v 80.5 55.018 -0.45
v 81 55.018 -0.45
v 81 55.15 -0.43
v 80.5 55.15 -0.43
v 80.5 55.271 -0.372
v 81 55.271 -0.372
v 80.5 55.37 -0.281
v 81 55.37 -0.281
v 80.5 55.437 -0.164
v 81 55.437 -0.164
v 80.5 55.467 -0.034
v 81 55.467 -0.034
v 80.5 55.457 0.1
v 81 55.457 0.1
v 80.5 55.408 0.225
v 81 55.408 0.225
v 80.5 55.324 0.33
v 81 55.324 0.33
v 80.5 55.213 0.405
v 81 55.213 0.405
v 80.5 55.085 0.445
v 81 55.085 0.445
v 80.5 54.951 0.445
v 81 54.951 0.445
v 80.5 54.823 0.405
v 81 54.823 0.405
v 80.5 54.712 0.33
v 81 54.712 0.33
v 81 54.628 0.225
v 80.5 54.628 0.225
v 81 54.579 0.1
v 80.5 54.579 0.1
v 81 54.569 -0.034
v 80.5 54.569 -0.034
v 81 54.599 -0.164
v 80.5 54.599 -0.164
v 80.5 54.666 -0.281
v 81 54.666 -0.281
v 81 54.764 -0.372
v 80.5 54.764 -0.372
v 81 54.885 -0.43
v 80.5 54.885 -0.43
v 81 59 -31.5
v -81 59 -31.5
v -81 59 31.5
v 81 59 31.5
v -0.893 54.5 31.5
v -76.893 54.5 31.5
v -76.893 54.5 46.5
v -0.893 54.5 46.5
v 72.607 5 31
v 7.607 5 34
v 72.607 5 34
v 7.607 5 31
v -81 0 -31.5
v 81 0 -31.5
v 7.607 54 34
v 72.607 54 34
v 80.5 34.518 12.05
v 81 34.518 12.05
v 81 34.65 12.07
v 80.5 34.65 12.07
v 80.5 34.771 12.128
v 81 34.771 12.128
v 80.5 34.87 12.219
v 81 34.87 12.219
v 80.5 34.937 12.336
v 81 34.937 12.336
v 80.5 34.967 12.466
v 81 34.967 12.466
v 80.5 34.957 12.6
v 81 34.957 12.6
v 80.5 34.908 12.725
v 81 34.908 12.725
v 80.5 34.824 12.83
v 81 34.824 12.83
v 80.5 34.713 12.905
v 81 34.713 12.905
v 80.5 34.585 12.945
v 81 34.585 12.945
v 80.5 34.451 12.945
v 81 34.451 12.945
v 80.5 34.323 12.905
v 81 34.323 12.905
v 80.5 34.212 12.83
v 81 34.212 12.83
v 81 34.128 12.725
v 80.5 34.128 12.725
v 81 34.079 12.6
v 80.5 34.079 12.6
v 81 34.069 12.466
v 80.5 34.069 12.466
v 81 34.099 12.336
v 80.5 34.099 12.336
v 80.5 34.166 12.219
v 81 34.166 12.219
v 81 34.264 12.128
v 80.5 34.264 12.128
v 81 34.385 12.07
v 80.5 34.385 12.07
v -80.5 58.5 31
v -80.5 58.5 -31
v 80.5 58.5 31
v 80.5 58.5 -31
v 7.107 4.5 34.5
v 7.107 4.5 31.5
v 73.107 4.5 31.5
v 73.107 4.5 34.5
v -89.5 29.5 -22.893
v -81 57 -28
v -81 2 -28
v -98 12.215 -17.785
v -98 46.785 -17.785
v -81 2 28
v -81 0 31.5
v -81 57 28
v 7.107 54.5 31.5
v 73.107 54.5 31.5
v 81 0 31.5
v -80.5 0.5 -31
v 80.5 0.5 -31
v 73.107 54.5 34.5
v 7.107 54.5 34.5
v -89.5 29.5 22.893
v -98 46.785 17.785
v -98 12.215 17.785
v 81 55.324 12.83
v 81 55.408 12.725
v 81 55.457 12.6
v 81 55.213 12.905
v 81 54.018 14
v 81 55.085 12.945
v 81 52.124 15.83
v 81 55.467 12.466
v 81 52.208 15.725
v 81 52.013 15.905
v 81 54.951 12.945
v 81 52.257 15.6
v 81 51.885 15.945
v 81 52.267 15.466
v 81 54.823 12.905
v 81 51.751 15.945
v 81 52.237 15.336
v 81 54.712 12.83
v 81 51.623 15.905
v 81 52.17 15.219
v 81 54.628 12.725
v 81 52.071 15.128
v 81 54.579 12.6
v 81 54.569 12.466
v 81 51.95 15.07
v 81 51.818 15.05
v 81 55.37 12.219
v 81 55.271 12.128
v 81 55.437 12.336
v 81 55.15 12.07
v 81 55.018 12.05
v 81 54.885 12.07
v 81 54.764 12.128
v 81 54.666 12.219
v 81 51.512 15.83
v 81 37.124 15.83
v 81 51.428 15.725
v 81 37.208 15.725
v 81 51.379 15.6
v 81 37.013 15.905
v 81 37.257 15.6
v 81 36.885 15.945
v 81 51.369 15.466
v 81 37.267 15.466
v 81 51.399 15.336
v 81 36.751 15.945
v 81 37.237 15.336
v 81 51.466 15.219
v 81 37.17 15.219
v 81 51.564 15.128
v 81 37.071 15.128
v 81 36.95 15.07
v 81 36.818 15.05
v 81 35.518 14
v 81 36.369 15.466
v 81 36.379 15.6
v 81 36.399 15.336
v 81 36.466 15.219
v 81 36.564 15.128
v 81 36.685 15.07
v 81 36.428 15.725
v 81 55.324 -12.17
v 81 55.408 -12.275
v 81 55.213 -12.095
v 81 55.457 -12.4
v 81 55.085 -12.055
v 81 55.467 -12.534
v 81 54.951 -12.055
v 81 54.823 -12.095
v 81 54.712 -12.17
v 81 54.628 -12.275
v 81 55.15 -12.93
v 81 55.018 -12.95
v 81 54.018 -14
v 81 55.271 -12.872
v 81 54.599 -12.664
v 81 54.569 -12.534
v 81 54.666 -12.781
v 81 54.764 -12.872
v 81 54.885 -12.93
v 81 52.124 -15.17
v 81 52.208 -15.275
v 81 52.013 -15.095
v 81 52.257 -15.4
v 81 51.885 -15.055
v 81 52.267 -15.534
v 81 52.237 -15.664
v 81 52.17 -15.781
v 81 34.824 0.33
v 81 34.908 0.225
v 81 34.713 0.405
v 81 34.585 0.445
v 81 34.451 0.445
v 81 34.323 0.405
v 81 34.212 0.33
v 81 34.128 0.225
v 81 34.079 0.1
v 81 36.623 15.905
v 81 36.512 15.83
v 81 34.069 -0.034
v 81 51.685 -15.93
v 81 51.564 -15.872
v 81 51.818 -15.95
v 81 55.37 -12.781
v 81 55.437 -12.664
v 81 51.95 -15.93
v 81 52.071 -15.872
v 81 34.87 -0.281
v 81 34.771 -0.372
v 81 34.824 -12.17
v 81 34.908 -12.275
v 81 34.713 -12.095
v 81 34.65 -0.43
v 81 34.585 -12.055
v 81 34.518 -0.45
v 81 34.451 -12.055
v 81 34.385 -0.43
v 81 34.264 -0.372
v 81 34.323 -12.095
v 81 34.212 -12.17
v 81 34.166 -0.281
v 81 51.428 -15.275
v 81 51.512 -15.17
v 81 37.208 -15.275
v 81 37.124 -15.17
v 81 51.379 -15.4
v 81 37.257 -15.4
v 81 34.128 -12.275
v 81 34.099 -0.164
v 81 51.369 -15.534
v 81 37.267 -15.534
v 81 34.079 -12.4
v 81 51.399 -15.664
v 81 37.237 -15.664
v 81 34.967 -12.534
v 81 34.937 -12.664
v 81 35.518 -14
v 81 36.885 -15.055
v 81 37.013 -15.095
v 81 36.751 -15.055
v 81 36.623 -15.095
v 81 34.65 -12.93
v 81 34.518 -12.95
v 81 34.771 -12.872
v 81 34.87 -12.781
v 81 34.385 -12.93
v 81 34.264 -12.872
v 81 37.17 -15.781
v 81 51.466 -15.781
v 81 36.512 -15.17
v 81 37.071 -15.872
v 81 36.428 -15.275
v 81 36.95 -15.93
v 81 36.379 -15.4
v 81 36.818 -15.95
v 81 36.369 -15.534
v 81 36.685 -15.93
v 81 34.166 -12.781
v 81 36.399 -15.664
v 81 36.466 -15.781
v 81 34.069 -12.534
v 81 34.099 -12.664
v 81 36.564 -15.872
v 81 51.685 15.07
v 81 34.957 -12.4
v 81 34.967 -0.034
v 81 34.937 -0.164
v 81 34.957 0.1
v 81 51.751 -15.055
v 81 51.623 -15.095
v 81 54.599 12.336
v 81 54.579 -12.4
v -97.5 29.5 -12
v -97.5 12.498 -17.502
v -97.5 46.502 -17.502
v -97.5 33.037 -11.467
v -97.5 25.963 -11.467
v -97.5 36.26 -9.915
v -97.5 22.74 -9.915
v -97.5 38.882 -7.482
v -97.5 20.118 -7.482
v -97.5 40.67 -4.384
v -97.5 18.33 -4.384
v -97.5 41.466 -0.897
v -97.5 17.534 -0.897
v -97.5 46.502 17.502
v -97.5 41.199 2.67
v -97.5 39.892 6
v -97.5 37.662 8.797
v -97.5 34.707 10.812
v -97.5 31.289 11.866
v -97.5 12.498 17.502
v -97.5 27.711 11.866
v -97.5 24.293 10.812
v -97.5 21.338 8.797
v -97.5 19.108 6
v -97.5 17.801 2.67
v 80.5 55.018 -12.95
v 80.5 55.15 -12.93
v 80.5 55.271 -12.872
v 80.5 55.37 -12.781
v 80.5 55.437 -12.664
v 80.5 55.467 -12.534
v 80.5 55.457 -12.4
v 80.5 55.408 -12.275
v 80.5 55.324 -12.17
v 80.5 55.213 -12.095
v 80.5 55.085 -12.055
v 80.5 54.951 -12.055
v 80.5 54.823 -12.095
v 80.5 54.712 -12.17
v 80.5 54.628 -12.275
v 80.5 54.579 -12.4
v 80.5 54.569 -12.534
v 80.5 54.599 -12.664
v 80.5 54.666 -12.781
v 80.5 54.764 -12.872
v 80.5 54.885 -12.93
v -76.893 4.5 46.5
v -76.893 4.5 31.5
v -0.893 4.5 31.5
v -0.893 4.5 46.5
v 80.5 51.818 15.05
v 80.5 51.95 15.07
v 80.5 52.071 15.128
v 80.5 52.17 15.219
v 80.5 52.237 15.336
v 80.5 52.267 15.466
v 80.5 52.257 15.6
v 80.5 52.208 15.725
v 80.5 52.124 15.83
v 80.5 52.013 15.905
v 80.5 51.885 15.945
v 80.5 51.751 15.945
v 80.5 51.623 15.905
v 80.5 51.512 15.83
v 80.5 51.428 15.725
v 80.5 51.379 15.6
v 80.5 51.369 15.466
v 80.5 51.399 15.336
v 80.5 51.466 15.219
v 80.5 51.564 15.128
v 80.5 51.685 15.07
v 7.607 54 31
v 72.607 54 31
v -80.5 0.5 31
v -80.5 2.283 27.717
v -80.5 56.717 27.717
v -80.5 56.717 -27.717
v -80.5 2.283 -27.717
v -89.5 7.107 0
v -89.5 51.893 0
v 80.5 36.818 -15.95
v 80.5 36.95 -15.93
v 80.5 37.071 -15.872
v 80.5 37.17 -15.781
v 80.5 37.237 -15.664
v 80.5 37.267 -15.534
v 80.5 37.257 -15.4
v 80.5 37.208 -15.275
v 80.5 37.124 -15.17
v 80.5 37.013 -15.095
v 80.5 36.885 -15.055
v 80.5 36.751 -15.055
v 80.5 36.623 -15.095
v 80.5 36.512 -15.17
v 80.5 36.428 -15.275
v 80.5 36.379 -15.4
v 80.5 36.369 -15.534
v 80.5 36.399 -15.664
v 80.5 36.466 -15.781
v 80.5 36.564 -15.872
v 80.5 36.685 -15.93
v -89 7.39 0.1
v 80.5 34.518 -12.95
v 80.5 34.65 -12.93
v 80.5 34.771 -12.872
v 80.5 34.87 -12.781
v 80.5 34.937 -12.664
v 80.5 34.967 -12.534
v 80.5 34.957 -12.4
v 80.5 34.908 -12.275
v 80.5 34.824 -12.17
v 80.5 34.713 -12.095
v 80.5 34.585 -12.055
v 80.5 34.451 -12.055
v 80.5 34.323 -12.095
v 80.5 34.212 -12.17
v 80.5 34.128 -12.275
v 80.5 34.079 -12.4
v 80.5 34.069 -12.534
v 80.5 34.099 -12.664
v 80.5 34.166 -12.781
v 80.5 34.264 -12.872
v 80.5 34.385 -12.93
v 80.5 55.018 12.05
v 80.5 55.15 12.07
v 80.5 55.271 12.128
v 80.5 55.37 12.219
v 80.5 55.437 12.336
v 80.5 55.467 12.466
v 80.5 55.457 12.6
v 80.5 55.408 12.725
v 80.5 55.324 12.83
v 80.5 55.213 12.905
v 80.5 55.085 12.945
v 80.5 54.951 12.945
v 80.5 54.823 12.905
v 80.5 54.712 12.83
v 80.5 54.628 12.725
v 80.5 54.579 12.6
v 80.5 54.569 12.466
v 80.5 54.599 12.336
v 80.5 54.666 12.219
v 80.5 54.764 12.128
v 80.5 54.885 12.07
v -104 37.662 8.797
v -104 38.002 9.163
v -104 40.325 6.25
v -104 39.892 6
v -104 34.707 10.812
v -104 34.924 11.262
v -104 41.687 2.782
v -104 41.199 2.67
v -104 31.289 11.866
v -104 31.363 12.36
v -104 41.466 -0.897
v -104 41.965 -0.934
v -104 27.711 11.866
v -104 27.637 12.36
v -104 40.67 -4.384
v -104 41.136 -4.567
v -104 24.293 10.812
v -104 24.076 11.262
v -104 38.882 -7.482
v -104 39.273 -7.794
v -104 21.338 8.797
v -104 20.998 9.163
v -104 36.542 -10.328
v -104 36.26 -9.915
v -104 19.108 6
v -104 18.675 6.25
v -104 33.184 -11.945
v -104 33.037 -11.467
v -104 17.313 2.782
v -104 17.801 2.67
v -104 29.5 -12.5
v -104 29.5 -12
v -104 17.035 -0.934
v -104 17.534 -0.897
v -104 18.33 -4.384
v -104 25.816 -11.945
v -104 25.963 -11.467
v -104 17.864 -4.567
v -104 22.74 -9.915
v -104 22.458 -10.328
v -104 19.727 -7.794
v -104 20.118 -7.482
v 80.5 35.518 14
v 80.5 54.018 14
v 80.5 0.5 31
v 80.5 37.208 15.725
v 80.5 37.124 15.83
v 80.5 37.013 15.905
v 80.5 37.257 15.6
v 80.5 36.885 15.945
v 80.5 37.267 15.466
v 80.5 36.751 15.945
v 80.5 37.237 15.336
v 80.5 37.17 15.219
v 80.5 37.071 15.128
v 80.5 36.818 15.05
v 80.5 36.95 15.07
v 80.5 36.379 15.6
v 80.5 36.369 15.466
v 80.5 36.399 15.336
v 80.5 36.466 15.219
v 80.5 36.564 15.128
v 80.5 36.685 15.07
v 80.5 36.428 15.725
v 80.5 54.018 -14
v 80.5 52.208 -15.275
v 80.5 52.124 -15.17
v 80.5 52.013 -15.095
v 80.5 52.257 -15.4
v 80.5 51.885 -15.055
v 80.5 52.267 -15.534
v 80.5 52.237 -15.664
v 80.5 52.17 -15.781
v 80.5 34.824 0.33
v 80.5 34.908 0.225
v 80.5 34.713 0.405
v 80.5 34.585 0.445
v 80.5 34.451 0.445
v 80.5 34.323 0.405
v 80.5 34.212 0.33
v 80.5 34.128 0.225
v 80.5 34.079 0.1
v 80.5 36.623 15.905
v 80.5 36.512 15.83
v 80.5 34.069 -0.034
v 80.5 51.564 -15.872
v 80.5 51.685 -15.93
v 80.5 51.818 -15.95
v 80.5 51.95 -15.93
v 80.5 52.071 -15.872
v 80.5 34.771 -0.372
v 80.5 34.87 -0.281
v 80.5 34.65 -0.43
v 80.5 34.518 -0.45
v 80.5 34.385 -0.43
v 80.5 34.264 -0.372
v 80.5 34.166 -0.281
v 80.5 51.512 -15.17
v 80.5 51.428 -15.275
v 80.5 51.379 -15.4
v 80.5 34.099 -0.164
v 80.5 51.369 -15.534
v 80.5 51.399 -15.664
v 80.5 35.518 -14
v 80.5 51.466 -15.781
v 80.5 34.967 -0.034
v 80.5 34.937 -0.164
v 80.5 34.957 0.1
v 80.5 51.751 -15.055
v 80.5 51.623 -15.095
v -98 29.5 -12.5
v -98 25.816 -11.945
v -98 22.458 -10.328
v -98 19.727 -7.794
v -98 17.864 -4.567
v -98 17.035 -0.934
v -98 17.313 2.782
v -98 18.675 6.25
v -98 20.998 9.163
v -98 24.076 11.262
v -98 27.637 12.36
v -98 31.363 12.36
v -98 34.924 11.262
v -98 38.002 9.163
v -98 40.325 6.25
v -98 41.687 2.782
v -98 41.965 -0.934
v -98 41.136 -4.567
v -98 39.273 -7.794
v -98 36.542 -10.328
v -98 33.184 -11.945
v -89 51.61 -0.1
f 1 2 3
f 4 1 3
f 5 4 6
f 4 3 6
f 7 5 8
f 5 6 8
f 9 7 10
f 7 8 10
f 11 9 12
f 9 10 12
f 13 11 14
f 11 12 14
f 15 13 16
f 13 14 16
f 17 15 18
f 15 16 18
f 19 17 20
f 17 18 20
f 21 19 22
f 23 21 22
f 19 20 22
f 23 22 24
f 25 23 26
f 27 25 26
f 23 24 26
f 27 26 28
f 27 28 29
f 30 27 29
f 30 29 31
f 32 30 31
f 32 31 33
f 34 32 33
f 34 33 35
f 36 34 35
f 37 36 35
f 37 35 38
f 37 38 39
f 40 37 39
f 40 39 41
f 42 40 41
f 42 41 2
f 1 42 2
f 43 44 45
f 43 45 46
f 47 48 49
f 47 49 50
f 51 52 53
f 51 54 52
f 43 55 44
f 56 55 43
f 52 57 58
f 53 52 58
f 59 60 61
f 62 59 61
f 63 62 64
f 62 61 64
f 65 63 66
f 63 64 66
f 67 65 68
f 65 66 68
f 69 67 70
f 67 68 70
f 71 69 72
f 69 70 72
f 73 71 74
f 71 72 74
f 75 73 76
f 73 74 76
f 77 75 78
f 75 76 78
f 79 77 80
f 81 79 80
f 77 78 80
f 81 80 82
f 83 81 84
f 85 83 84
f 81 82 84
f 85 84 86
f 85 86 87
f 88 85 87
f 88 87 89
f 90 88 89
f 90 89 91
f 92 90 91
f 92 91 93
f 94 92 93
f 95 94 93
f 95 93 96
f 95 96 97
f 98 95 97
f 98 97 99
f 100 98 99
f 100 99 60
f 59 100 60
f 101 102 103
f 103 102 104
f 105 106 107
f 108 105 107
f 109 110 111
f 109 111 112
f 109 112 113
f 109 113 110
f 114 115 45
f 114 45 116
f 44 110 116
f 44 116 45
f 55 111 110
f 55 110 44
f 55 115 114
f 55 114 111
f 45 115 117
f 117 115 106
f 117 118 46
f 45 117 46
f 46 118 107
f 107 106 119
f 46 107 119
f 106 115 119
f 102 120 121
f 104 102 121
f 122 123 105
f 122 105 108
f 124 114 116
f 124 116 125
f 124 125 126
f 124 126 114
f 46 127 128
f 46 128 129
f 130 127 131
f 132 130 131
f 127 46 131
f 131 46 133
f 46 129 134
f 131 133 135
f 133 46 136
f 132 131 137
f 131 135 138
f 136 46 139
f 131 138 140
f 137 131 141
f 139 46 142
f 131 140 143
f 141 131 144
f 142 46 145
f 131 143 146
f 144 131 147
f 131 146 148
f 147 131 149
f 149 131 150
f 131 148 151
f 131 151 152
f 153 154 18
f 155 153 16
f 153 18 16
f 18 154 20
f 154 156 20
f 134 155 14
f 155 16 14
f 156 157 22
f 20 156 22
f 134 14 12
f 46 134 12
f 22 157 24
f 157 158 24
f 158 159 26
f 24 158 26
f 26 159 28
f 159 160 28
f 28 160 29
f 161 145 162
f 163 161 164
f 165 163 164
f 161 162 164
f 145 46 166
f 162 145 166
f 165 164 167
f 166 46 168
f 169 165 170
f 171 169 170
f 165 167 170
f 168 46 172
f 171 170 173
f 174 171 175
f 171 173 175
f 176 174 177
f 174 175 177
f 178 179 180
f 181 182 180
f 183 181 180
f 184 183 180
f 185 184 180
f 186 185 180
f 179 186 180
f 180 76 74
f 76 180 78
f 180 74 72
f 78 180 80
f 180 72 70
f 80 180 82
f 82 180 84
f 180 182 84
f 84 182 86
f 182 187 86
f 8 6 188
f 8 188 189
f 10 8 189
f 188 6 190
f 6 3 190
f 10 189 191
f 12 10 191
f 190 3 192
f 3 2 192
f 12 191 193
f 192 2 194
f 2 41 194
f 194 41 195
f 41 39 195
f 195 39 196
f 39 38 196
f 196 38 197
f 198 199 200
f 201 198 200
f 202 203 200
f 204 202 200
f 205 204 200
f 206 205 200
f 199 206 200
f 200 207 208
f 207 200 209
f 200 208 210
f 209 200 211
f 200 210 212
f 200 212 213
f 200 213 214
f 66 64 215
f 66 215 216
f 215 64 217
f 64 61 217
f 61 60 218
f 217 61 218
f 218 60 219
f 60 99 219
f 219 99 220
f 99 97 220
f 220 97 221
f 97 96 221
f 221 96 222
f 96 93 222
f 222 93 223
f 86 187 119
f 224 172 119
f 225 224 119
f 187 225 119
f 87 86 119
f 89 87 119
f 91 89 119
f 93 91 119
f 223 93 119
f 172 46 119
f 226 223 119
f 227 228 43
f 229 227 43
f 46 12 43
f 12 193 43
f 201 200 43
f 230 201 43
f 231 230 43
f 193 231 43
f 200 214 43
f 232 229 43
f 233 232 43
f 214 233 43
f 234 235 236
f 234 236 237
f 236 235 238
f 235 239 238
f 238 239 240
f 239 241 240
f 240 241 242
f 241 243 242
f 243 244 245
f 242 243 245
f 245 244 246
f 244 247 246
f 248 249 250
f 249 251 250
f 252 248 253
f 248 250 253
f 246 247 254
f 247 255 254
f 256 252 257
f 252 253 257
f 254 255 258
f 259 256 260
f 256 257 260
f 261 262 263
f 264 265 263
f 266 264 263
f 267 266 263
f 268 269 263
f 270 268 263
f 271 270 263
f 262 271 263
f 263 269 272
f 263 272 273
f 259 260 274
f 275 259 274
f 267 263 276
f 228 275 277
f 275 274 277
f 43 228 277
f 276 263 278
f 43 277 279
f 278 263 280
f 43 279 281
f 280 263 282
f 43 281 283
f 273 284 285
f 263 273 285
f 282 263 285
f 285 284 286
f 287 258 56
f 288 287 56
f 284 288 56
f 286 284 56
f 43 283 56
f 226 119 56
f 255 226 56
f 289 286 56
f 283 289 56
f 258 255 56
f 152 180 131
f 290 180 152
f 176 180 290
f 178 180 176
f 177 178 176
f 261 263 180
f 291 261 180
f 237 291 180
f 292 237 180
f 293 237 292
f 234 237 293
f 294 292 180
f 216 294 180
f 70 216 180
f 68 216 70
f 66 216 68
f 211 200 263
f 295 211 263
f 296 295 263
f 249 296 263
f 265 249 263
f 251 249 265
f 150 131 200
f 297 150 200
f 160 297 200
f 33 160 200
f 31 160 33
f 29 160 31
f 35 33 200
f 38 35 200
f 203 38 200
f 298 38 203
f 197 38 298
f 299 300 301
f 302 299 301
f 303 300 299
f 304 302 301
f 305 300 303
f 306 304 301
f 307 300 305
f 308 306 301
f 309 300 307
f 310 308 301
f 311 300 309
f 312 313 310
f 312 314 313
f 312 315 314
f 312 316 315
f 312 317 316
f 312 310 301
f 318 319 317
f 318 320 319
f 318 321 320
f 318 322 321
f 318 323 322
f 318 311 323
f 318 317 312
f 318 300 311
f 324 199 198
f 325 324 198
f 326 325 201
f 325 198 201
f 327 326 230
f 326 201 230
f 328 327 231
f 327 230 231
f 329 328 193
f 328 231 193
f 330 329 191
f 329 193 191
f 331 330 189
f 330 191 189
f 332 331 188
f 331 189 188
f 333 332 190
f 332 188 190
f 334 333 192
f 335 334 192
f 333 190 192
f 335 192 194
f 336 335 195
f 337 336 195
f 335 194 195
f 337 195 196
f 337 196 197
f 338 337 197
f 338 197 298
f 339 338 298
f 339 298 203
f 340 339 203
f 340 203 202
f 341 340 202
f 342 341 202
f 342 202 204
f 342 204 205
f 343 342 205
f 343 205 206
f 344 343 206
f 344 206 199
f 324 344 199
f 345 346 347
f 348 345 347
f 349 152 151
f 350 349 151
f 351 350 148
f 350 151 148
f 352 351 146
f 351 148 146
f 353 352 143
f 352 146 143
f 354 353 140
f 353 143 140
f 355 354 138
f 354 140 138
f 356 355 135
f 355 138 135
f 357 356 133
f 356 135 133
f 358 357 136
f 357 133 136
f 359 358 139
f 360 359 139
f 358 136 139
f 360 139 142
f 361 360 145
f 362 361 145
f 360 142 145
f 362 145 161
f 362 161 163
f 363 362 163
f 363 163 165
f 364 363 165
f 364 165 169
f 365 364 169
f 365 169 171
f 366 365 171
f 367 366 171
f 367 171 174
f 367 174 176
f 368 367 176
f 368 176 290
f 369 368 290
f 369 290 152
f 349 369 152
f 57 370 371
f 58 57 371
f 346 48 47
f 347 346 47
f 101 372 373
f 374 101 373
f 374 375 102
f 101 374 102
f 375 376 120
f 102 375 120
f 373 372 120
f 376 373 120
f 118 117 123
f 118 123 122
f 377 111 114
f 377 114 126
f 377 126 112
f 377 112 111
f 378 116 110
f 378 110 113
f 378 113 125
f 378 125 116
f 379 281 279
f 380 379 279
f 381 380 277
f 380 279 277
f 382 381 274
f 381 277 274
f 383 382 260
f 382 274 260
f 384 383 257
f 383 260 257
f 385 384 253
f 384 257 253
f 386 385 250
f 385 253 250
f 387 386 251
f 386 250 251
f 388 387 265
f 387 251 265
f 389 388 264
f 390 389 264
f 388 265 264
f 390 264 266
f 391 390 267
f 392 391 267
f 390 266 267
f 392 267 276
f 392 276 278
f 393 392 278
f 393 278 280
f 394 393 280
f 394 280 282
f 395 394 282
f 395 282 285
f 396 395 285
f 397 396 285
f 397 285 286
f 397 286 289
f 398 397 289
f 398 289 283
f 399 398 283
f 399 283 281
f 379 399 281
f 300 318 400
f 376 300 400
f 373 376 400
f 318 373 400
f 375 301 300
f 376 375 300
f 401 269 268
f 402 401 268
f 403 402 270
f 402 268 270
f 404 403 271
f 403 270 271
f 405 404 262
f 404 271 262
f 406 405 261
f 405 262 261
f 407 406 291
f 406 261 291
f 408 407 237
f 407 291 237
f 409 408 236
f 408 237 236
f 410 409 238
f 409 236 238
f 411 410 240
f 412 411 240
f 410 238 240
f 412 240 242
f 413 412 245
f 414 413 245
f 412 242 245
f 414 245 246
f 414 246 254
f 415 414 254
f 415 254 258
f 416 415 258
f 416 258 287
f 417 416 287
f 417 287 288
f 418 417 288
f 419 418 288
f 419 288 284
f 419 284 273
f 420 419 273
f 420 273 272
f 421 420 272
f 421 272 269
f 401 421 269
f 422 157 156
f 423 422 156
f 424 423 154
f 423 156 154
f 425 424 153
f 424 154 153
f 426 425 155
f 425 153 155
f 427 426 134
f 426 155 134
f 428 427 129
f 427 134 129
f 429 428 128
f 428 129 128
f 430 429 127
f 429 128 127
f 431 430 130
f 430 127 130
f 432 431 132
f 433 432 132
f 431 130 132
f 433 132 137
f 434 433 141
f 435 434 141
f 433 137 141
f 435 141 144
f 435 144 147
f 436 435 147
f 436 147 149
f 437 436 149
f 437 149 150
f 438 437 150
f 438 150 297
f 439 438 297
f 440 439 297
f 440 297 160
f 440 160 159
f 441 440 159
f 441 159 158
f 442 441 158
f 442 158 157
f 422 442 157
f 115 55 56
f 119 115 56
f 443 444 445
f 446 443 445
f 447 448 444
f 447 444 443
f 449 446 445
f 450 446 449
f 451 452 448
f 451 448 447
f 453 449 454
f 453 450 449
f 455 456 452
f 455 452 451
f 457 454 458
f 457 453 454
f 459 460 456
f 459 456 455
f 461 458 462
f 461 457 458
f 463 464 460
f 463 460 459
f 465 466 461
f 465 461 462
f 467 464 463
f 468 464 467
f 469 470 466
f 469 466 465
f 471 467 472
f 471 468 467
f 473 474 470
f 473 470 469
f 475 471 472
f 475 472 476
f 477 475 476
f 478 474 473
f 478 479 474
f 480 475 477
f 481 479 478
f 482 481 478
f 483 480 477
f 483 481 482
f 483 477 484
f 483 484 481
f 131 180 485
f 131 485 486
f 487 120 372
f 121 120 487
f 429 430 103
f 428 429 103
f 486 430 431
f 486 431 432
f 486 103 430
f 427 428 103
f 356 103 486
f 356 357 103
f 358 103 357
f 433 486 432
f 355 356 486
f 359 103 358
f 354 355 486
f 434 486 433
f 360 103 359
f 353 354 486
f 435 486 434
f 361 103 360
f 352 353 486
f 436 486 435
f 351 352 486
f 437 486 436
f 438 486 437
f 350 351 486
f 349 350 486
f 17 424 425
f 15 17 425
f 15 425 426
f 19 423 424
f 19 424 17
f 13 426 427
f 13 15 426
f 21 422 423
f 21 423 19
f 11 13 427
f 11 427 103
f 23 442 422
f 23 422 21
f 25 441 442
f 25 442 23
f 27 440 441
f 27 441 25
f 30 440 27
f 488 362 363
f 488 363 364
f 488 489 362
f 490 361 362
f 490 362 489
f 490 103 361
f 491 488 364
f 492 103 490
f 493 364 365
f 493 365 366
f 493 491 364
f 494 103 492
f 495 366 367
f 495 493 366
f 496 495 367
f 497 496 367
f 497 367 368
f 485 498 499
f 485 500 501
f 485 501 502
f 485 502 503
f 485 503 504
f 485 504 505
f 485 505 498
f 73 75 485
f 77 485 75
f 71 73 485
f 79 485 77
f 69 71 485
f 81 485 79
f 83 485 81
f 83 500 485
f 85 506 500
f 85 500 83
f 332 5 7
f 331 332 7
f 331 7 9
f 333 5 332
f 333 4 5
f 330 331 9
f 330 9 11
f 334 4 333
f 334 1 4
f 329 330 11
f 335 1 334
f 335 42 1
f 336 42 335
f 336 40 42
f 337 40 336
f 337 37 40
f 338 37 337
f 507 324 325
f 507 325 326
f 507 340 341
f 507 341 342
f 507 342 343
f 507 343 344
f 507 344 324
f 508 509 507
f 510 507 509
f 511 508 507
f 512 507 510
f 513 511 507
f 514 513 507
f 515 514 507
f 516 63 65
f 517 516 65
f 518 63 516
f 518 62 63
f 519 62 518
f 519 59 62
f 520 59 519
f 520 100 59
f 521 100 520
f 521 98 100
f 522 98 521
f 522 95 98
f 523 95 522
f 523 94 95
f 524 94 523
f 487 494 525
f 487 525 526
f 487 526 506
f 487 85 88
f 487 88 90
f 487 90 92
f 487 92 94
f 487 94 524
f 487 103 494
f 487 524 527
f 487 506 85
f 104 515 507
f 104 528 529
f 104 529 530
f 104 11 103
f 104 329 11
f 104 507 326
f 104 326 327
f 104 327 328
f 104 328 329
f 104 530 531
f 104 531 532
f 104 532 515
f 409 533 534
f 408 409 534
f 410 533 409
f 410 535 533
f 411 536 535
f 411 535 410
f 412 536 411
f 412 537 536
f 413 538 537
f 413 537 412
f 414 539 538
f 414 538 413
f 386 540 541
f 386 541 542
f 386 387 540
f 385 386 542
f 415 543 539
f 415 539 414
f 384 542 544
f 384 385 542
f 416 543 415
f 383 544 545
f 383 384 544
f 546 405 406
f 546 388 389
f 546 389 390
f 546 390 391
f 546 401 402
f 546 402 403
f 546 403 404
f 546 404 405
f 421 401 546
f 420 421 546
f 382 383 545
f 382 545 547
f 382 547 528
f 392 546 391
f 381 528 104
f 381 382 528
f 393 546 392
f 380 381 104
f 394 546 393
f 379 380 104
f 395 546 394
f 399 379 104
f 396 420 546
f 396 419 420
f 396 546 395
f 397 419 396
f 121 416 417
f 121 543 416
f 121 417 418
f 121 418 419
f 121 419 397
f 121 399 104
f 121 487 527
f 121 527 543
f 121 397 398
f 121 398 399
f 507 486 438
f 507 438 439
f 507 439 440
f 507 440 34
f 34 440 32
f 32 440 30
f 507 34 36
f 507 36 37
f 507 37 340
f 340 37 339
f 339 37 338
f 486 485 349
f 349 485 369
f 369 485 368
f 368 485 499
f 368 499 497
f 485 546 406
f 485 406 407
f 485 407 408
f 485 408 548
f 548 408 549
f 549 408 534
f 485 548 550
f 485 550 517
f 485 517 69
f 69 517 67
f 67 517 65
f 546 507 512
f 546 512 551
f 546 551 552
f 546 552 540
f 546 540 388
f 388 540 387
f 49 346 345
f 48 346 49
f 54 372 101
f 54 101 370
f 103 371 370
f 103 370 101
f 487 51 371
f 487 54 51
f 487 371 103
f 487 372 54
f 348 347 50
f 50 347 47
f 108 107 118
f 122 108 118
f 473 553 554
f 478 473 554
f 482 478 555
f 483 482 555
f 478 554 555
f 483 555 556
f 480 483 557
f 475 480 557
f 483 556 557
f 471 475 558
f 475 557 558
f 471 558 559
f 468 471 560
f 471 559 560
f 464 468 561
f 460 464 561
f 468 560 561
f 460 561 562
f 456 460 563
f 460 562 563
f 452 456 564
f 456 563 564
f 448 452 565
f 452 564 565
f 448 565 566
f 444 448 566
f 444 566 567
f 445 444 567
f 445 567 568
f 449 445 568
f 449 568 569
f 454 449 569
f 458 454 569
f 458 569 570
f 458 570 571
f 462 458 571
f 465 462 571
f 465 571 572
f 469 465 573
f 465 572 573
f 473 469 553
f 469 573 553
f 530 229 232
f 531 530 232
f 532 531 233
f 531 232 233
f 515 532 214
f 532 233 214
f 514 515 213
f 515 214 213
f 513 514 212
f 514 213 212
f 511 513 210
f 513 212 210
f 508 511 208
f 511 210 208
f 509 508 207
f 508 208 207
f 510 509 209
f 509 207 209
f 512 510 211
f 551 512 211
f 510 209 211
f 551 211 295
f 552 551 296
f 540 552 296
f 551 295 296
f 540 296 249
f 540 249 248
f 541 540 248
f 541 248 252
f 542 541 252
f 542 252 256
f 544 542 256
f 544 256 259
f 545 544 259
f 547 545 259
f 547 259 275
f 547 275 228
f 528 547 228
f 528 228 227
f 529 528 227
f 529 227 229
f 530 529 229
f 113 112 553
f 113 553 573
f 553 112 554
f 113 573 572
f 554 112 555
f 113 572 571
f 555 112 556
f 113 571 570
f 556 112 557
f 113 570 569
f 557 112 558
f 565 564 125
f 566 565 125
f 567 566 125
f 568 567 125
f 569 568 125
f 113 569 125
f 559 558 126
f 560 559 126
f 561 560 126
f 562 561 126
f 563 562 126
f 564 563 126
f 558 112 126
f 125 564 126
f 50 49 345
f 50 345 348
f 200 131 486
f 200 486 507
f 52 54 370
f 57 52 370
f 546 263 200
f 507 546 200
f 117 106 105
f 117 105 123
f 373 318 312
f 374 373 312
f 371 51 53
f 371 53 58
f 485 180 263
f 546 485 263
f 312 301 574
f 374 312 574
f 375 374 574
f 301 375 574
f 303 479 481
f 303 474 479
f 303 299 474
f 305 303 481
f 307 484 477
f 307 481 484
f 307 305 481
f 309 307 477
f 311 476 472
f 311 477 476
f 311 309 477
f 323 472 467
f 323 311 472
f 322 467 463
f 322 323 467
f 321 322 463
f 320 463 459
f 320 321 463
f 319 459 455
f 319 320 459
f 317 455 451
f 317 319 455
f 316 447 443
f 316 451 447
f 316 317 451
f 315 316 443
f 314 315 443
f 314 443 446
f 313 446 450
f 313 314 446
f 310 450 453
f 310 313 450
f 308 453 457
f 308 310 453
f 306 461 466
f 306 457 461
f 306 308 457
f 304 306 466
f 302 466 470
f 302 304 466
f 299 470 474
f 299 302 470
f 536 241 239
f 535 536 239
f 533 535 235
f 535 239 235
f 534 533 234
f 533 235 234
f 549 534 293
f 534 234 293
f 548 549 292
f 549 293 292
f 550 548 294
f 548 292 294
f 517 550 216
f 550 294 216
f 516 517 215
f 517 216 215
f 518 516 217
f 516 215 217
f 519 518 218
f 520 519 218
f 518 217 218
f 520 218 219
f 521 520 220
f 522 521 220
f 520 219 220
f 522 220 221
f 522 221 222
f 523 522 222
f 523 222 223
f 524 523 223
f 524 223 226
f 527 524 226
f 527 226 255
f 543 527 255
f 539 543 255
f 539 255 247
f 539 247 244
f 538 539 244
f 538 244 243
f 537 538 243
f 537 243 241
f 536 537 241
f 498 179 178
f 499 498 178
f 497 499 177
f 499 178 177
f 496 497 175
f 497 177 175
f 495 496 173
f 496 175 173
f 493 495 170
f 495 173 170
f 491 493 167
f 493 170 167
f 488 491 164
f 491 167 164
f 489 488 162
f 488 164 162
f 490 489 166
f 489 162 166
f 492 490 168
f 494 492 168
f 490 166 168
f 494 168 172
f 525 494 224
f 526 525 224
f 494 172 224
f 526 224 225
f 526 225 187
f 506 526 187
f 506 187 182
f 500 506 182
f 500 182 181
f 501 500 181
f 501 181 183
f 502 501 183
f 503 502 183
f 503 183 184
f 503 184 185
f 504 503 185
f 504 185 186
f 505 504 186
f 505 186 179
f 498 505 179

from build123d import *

# Parameters (mm, degrees)
SKETCH1_W           = 1620
SKETCH1_H           = 630
BOSS_EXTRUDE1_DEPTH = 590
SKETCH2_W           = 760
SKETCH2_H           = 500
BOSS_EXTRUDE2_DEPTH = 150
SKETCH3_W           = 560
SKETCH3_H           = 550
BOSS_EXTRUDE3_DEPTH = 170
BOSS_EXTRUDE3_TAPER = 31
SKETCH4_R           = 125
BOSS_EXTRUDE4_DEPTH = 60
SKETCH5_W           = 660
SKETCH5_H           = 500
BOSS_EXTRUDE5_DEPTH = 30
SHELL1_T            = -5
SKETCH7_R           = 4.5
SKETCH7_W           = 280
SKETCH7_H           = 185
CUT_EXTRUDE1_DEPTH  = 10
SCALE1_SCALE        = 0.1


with BuildPart() as part:
    # Sketch1 → Boss-Extrude1 (new body)
    with BuildSketch(Plane(origin=(0, 0, 0), x_dir=(1, 0, 0), z_dir=(0, 1, 0))):
        Rectangle(SKETCH1_W, SKETCH1_H)
    extrude(amount=BOSS_EXTRUDE1_DEPTH)

    # Sketch3 → Boss-Extrude3 (add)
    with BuildSketch(Plane.ZY.offset(810)):
        with Locations((0, 295)):
            Rectangle(SKETCH3_W, SKETCH3_H)
    extrude(amount=BOSS_EXTRUDE3_DEPTH, taper=BOSS_EXTRUDE3_TAPER)

    # Sketch4 → Boss-Extrude4 (add)
    with BuildSketch(Plane.ZY.offset(980)):
        with Locations(Location((0, 295, 0), (0, 0, 180))):
            Circle(SKETCH4_R)
    extrude(amount=BOSS_EXTRUDE4_DEPTH)

    # Sketch5 → Boss-Extrude5 (add)
    with BuildSketch(Plane.XY.offset(315)):
        with Locations((401.07364471, 295)):
            Rectangle(SKETCH5_W, SKETCH5_H)
    extrude(amount=BOSS_EXTRUDE5_DEPTH)

    # Shell1
    shell1_openings = [part.faces().sort_by_distance(p)[0] for p in [
        (-1040, 295, 0),
    ]]
    offset(amount=SHELL1_T, openings=shell1_openings, kind=Kind.INTERSECTION)

    # Sketch7 → Cut-Extrude1 (cut)
    with BuildSketch(Plane(origin=(810, 0, 0), x_dir=(0, 0, -1), z_dir=(1, 0, 0))):
        with Locations((-125, 550.17844245)):
            Circle(SKETCH7_R)
        with Locations((0, 550.17844245)):
            Circle(SKETCH7_R)
        with Locations((125, 550.17844245)):
            Circle(SKETCH7_R)
        with Locations((0, 345.17844245)):
            Circle(SKETCH7_R)
        with Locations((125, 345.17844245)):
            Circle(SKETCH7_R)
        with Locations((-125, 345.17844245)):
            Circle(SKETCH7_R)
        with Locations((-155, 518.17844245)):
            Circle(SKETCH7_R)
        with Locations((155, 518.17844245)):
            Circle(SKETCH7_R)
        with Locations((155, 368.17844245)):
            Circle(SKETCH7_R)
        with Locations((-155, 368.17844245)):
            Circle(SKETCH7_R)
        with Locations((0, 447.67844245)):
            Rectangle(SKETCH7_W, SKETCH7_H)
    extrude(amount=-CUT_EXTRUDE1_DEPTH, mode=Mode.SUBTRACT)


with BuildPart() as body_2:
    # Sketch2 → Boss-Extrude2 (new body)
    with BuildSketch(Plane.XY.offset(315)):
        with Locations((-388.92635529, 295)):
            Rectangle(SKETCH2_W, SKETCH2_H)
    extrude(amount=BOSS_EXTRUDE2_DEPTH)


with BuildPart() as body_2_1:
    # Scale1: scaled about (0, 0, 0)
    add(body_2.part.scale(SCALE1_SCALE))


with BuildPart() as part_1:
    # Scale1: scaled about (0, 0, 0)
    add(part.part.scale(SCALE1_SCALE))


solid = Compound([body_2_1.part, part_1.part])
